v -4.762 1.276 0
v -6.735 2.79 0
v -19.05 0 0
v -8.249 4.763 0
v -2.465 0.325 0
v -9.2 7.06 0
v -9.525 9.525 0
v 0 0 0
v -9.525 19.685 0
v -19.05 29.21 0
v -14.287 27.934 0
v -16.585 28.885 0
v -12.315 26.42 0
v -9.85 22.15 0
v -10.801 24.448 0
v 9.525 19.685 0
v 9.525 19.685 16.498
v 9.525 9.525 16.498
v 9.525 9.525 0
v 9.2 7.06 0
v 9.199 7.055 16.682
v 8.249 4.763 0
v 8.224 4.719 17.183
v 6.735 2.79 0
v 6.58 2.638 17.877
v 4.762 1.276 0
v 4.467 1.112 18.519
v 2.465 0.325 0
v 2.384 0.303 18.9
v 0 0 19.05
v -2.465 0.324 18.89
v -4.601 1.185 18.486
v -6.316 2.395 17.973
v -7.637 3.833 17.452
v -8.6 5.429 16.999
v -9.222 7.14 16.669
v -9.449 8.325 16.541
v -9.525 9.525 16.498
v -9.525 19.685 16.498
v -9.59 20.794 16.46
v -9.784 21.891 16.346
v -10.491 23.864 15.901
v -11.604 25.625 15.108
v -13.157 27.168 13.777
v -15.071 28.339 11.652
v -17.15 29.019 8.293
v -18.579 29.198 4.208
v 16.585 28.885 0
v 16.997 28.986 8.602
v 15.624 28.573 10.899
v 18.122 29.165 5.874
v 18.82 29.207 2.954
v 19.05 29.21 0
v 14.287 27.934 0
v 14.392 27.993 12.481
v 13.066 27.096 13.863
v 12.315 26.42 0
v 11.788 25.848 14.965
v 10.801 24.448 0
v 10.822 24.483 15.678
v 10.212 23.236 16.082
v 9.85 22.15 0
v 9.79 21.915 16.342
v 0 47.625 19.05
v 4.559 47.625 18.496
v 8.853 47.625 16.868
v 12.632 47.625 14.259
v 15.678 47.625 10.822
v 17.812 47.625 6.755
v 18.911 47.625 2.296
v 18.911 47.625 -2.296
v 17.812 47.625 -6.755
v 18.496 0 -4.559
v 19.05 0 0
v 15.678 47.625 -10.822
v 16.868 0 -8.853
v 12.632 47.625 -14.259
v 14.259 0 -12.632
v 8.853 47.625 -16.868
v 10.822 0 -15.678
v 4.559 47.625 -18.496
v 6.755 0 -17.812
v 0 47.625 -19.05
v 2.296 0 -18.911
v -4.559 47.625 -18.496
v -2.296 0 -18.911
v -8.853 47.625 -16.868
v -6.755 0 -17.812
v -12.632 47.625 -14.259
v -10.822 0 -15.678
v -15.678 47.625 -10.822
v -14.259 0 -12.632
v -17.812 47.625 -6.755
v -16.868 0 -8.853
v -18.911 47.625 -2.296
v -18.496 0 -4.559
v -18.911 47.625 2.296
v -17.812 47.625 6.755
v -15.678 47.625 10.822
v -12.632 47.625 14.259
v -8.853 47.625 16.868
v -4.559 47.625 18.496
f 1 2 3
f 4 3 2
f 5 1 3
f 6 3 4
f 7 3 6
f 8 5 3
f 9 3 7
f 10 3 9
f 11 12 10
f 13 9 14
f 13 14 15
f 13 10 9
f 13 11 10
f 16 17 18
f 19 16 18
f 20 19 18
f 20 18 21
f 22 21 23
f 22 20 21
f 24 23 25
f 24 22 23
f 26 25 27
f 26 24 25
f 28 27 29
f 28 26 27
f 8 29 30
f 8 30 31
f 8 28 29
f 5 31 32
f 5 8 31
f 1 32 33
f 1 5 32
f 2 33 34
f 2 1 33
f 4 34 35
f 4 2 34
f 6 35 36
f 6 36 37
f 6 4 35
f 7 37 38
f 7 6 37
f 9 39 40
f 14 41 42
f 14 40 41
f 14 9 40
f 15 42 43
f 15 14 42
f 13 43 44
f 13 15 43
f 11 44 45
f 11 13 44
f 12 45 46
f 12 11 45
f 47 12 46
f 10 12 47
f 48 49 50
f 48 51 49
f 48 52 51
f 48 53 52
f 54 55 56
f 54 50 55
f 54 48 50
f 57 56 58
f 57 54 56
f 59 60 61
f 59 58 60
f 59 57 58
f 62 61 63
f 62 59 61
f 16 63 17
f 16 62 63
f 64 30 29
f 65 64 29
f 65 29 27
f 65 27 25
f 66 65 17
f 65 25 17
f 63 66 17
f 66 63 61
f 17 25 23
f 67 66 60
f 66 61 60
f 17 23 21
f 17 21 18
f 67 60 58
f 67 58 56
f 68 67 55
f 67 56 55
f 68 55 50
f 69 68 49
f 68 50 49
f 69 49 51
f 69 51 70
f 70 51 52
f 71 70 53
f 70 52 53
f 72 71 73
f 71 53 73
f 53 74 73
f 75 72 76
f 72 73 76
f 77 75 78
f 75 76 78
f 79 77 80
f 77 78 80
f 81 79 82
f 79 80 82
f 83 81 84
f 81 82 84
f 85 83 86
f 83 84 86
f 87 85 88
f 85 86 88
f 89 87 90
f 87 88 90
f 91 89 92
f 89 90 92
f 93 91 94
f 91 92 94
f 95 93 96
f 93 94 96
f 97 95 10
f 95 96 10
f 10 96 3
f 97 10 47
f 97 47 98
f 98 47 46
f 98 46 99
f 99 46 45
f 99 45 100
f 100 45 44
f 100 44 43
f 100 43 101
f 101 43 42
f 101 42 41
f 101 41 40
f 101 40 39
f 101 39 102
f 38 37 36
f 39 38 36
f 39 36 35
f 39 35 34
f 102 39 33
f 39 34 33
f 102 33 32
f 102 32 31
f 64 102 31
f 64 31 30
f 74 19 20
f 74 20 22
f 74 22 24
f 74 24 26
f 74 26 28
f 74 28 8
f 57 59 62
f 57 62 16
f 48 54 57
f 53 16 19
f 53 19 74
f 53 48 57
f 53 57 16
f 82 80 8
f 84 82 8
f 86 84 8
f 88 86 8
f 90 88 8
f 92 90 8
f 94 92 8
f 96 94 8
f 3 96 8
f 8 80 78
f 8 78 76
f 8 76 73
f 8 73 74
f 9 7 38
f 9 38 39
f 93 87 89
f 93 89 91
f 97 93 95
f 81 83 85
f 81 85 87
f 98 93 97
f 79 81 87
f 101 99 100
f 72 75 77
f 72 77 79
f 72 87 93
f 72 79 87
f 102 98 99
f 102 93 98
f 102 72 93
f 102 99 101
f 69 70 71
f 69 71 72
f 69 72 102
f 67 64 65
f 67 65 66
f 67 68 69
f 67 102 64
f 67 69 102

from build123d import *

# Parameters (mm, degrees)
SKETCH1_R           = 19.05
BOSS_EXTRUDE1_DEPTH = 47.625
CUT_EXTRUDE1_DEPTH  = 55.716959208


with BuildPart() as part:
    # Sketch1 → Boss-Extrude1 (new body)
    with BuildSketch(Plane(origin=(0, 0, 0), x_dir=(1, 0, 0), z_dir=(0, 1, 0))):
        with Locations(Location((0, 0, 0), (0, 0, 270))):
            Circle(SKETCH1_R)
    extrude(amount=BOSS_EXTRUDE1_DEPTH)

    # Sketch2 → Cut-Extrude1 (cut, through all)
    with BuildSketch(Plane.XY):
        with BuildLine():
            Line((-19.05, -1.366), (19.05, -1.366))
            Line((19.05, -1.366), (19.05, 29.21))
            ThreePointArc((19.05, 29.21), (12.314807909, 26.420192091), (9.525, 19.685))
            Line((9.525, 19.685), (9.525, 9.525))
            ThreePointArc((9.525, 9.525), (0, 0), (-9.525, 9.525))
            Line((-9.525, 9.525), (-9.525, 19.685))
            ThreePointArc((-9.525, 19.685), (-12.314807909, 26.420192091), (-19.05, 29.21))
            Line((-19.05, 29.21), (-19.05, -1.366))
        make_face()
    extrude(amount=CUT_EXTRUDE1_DEPTH, mode=Mode.SUBTRACT)


solid = part.part
